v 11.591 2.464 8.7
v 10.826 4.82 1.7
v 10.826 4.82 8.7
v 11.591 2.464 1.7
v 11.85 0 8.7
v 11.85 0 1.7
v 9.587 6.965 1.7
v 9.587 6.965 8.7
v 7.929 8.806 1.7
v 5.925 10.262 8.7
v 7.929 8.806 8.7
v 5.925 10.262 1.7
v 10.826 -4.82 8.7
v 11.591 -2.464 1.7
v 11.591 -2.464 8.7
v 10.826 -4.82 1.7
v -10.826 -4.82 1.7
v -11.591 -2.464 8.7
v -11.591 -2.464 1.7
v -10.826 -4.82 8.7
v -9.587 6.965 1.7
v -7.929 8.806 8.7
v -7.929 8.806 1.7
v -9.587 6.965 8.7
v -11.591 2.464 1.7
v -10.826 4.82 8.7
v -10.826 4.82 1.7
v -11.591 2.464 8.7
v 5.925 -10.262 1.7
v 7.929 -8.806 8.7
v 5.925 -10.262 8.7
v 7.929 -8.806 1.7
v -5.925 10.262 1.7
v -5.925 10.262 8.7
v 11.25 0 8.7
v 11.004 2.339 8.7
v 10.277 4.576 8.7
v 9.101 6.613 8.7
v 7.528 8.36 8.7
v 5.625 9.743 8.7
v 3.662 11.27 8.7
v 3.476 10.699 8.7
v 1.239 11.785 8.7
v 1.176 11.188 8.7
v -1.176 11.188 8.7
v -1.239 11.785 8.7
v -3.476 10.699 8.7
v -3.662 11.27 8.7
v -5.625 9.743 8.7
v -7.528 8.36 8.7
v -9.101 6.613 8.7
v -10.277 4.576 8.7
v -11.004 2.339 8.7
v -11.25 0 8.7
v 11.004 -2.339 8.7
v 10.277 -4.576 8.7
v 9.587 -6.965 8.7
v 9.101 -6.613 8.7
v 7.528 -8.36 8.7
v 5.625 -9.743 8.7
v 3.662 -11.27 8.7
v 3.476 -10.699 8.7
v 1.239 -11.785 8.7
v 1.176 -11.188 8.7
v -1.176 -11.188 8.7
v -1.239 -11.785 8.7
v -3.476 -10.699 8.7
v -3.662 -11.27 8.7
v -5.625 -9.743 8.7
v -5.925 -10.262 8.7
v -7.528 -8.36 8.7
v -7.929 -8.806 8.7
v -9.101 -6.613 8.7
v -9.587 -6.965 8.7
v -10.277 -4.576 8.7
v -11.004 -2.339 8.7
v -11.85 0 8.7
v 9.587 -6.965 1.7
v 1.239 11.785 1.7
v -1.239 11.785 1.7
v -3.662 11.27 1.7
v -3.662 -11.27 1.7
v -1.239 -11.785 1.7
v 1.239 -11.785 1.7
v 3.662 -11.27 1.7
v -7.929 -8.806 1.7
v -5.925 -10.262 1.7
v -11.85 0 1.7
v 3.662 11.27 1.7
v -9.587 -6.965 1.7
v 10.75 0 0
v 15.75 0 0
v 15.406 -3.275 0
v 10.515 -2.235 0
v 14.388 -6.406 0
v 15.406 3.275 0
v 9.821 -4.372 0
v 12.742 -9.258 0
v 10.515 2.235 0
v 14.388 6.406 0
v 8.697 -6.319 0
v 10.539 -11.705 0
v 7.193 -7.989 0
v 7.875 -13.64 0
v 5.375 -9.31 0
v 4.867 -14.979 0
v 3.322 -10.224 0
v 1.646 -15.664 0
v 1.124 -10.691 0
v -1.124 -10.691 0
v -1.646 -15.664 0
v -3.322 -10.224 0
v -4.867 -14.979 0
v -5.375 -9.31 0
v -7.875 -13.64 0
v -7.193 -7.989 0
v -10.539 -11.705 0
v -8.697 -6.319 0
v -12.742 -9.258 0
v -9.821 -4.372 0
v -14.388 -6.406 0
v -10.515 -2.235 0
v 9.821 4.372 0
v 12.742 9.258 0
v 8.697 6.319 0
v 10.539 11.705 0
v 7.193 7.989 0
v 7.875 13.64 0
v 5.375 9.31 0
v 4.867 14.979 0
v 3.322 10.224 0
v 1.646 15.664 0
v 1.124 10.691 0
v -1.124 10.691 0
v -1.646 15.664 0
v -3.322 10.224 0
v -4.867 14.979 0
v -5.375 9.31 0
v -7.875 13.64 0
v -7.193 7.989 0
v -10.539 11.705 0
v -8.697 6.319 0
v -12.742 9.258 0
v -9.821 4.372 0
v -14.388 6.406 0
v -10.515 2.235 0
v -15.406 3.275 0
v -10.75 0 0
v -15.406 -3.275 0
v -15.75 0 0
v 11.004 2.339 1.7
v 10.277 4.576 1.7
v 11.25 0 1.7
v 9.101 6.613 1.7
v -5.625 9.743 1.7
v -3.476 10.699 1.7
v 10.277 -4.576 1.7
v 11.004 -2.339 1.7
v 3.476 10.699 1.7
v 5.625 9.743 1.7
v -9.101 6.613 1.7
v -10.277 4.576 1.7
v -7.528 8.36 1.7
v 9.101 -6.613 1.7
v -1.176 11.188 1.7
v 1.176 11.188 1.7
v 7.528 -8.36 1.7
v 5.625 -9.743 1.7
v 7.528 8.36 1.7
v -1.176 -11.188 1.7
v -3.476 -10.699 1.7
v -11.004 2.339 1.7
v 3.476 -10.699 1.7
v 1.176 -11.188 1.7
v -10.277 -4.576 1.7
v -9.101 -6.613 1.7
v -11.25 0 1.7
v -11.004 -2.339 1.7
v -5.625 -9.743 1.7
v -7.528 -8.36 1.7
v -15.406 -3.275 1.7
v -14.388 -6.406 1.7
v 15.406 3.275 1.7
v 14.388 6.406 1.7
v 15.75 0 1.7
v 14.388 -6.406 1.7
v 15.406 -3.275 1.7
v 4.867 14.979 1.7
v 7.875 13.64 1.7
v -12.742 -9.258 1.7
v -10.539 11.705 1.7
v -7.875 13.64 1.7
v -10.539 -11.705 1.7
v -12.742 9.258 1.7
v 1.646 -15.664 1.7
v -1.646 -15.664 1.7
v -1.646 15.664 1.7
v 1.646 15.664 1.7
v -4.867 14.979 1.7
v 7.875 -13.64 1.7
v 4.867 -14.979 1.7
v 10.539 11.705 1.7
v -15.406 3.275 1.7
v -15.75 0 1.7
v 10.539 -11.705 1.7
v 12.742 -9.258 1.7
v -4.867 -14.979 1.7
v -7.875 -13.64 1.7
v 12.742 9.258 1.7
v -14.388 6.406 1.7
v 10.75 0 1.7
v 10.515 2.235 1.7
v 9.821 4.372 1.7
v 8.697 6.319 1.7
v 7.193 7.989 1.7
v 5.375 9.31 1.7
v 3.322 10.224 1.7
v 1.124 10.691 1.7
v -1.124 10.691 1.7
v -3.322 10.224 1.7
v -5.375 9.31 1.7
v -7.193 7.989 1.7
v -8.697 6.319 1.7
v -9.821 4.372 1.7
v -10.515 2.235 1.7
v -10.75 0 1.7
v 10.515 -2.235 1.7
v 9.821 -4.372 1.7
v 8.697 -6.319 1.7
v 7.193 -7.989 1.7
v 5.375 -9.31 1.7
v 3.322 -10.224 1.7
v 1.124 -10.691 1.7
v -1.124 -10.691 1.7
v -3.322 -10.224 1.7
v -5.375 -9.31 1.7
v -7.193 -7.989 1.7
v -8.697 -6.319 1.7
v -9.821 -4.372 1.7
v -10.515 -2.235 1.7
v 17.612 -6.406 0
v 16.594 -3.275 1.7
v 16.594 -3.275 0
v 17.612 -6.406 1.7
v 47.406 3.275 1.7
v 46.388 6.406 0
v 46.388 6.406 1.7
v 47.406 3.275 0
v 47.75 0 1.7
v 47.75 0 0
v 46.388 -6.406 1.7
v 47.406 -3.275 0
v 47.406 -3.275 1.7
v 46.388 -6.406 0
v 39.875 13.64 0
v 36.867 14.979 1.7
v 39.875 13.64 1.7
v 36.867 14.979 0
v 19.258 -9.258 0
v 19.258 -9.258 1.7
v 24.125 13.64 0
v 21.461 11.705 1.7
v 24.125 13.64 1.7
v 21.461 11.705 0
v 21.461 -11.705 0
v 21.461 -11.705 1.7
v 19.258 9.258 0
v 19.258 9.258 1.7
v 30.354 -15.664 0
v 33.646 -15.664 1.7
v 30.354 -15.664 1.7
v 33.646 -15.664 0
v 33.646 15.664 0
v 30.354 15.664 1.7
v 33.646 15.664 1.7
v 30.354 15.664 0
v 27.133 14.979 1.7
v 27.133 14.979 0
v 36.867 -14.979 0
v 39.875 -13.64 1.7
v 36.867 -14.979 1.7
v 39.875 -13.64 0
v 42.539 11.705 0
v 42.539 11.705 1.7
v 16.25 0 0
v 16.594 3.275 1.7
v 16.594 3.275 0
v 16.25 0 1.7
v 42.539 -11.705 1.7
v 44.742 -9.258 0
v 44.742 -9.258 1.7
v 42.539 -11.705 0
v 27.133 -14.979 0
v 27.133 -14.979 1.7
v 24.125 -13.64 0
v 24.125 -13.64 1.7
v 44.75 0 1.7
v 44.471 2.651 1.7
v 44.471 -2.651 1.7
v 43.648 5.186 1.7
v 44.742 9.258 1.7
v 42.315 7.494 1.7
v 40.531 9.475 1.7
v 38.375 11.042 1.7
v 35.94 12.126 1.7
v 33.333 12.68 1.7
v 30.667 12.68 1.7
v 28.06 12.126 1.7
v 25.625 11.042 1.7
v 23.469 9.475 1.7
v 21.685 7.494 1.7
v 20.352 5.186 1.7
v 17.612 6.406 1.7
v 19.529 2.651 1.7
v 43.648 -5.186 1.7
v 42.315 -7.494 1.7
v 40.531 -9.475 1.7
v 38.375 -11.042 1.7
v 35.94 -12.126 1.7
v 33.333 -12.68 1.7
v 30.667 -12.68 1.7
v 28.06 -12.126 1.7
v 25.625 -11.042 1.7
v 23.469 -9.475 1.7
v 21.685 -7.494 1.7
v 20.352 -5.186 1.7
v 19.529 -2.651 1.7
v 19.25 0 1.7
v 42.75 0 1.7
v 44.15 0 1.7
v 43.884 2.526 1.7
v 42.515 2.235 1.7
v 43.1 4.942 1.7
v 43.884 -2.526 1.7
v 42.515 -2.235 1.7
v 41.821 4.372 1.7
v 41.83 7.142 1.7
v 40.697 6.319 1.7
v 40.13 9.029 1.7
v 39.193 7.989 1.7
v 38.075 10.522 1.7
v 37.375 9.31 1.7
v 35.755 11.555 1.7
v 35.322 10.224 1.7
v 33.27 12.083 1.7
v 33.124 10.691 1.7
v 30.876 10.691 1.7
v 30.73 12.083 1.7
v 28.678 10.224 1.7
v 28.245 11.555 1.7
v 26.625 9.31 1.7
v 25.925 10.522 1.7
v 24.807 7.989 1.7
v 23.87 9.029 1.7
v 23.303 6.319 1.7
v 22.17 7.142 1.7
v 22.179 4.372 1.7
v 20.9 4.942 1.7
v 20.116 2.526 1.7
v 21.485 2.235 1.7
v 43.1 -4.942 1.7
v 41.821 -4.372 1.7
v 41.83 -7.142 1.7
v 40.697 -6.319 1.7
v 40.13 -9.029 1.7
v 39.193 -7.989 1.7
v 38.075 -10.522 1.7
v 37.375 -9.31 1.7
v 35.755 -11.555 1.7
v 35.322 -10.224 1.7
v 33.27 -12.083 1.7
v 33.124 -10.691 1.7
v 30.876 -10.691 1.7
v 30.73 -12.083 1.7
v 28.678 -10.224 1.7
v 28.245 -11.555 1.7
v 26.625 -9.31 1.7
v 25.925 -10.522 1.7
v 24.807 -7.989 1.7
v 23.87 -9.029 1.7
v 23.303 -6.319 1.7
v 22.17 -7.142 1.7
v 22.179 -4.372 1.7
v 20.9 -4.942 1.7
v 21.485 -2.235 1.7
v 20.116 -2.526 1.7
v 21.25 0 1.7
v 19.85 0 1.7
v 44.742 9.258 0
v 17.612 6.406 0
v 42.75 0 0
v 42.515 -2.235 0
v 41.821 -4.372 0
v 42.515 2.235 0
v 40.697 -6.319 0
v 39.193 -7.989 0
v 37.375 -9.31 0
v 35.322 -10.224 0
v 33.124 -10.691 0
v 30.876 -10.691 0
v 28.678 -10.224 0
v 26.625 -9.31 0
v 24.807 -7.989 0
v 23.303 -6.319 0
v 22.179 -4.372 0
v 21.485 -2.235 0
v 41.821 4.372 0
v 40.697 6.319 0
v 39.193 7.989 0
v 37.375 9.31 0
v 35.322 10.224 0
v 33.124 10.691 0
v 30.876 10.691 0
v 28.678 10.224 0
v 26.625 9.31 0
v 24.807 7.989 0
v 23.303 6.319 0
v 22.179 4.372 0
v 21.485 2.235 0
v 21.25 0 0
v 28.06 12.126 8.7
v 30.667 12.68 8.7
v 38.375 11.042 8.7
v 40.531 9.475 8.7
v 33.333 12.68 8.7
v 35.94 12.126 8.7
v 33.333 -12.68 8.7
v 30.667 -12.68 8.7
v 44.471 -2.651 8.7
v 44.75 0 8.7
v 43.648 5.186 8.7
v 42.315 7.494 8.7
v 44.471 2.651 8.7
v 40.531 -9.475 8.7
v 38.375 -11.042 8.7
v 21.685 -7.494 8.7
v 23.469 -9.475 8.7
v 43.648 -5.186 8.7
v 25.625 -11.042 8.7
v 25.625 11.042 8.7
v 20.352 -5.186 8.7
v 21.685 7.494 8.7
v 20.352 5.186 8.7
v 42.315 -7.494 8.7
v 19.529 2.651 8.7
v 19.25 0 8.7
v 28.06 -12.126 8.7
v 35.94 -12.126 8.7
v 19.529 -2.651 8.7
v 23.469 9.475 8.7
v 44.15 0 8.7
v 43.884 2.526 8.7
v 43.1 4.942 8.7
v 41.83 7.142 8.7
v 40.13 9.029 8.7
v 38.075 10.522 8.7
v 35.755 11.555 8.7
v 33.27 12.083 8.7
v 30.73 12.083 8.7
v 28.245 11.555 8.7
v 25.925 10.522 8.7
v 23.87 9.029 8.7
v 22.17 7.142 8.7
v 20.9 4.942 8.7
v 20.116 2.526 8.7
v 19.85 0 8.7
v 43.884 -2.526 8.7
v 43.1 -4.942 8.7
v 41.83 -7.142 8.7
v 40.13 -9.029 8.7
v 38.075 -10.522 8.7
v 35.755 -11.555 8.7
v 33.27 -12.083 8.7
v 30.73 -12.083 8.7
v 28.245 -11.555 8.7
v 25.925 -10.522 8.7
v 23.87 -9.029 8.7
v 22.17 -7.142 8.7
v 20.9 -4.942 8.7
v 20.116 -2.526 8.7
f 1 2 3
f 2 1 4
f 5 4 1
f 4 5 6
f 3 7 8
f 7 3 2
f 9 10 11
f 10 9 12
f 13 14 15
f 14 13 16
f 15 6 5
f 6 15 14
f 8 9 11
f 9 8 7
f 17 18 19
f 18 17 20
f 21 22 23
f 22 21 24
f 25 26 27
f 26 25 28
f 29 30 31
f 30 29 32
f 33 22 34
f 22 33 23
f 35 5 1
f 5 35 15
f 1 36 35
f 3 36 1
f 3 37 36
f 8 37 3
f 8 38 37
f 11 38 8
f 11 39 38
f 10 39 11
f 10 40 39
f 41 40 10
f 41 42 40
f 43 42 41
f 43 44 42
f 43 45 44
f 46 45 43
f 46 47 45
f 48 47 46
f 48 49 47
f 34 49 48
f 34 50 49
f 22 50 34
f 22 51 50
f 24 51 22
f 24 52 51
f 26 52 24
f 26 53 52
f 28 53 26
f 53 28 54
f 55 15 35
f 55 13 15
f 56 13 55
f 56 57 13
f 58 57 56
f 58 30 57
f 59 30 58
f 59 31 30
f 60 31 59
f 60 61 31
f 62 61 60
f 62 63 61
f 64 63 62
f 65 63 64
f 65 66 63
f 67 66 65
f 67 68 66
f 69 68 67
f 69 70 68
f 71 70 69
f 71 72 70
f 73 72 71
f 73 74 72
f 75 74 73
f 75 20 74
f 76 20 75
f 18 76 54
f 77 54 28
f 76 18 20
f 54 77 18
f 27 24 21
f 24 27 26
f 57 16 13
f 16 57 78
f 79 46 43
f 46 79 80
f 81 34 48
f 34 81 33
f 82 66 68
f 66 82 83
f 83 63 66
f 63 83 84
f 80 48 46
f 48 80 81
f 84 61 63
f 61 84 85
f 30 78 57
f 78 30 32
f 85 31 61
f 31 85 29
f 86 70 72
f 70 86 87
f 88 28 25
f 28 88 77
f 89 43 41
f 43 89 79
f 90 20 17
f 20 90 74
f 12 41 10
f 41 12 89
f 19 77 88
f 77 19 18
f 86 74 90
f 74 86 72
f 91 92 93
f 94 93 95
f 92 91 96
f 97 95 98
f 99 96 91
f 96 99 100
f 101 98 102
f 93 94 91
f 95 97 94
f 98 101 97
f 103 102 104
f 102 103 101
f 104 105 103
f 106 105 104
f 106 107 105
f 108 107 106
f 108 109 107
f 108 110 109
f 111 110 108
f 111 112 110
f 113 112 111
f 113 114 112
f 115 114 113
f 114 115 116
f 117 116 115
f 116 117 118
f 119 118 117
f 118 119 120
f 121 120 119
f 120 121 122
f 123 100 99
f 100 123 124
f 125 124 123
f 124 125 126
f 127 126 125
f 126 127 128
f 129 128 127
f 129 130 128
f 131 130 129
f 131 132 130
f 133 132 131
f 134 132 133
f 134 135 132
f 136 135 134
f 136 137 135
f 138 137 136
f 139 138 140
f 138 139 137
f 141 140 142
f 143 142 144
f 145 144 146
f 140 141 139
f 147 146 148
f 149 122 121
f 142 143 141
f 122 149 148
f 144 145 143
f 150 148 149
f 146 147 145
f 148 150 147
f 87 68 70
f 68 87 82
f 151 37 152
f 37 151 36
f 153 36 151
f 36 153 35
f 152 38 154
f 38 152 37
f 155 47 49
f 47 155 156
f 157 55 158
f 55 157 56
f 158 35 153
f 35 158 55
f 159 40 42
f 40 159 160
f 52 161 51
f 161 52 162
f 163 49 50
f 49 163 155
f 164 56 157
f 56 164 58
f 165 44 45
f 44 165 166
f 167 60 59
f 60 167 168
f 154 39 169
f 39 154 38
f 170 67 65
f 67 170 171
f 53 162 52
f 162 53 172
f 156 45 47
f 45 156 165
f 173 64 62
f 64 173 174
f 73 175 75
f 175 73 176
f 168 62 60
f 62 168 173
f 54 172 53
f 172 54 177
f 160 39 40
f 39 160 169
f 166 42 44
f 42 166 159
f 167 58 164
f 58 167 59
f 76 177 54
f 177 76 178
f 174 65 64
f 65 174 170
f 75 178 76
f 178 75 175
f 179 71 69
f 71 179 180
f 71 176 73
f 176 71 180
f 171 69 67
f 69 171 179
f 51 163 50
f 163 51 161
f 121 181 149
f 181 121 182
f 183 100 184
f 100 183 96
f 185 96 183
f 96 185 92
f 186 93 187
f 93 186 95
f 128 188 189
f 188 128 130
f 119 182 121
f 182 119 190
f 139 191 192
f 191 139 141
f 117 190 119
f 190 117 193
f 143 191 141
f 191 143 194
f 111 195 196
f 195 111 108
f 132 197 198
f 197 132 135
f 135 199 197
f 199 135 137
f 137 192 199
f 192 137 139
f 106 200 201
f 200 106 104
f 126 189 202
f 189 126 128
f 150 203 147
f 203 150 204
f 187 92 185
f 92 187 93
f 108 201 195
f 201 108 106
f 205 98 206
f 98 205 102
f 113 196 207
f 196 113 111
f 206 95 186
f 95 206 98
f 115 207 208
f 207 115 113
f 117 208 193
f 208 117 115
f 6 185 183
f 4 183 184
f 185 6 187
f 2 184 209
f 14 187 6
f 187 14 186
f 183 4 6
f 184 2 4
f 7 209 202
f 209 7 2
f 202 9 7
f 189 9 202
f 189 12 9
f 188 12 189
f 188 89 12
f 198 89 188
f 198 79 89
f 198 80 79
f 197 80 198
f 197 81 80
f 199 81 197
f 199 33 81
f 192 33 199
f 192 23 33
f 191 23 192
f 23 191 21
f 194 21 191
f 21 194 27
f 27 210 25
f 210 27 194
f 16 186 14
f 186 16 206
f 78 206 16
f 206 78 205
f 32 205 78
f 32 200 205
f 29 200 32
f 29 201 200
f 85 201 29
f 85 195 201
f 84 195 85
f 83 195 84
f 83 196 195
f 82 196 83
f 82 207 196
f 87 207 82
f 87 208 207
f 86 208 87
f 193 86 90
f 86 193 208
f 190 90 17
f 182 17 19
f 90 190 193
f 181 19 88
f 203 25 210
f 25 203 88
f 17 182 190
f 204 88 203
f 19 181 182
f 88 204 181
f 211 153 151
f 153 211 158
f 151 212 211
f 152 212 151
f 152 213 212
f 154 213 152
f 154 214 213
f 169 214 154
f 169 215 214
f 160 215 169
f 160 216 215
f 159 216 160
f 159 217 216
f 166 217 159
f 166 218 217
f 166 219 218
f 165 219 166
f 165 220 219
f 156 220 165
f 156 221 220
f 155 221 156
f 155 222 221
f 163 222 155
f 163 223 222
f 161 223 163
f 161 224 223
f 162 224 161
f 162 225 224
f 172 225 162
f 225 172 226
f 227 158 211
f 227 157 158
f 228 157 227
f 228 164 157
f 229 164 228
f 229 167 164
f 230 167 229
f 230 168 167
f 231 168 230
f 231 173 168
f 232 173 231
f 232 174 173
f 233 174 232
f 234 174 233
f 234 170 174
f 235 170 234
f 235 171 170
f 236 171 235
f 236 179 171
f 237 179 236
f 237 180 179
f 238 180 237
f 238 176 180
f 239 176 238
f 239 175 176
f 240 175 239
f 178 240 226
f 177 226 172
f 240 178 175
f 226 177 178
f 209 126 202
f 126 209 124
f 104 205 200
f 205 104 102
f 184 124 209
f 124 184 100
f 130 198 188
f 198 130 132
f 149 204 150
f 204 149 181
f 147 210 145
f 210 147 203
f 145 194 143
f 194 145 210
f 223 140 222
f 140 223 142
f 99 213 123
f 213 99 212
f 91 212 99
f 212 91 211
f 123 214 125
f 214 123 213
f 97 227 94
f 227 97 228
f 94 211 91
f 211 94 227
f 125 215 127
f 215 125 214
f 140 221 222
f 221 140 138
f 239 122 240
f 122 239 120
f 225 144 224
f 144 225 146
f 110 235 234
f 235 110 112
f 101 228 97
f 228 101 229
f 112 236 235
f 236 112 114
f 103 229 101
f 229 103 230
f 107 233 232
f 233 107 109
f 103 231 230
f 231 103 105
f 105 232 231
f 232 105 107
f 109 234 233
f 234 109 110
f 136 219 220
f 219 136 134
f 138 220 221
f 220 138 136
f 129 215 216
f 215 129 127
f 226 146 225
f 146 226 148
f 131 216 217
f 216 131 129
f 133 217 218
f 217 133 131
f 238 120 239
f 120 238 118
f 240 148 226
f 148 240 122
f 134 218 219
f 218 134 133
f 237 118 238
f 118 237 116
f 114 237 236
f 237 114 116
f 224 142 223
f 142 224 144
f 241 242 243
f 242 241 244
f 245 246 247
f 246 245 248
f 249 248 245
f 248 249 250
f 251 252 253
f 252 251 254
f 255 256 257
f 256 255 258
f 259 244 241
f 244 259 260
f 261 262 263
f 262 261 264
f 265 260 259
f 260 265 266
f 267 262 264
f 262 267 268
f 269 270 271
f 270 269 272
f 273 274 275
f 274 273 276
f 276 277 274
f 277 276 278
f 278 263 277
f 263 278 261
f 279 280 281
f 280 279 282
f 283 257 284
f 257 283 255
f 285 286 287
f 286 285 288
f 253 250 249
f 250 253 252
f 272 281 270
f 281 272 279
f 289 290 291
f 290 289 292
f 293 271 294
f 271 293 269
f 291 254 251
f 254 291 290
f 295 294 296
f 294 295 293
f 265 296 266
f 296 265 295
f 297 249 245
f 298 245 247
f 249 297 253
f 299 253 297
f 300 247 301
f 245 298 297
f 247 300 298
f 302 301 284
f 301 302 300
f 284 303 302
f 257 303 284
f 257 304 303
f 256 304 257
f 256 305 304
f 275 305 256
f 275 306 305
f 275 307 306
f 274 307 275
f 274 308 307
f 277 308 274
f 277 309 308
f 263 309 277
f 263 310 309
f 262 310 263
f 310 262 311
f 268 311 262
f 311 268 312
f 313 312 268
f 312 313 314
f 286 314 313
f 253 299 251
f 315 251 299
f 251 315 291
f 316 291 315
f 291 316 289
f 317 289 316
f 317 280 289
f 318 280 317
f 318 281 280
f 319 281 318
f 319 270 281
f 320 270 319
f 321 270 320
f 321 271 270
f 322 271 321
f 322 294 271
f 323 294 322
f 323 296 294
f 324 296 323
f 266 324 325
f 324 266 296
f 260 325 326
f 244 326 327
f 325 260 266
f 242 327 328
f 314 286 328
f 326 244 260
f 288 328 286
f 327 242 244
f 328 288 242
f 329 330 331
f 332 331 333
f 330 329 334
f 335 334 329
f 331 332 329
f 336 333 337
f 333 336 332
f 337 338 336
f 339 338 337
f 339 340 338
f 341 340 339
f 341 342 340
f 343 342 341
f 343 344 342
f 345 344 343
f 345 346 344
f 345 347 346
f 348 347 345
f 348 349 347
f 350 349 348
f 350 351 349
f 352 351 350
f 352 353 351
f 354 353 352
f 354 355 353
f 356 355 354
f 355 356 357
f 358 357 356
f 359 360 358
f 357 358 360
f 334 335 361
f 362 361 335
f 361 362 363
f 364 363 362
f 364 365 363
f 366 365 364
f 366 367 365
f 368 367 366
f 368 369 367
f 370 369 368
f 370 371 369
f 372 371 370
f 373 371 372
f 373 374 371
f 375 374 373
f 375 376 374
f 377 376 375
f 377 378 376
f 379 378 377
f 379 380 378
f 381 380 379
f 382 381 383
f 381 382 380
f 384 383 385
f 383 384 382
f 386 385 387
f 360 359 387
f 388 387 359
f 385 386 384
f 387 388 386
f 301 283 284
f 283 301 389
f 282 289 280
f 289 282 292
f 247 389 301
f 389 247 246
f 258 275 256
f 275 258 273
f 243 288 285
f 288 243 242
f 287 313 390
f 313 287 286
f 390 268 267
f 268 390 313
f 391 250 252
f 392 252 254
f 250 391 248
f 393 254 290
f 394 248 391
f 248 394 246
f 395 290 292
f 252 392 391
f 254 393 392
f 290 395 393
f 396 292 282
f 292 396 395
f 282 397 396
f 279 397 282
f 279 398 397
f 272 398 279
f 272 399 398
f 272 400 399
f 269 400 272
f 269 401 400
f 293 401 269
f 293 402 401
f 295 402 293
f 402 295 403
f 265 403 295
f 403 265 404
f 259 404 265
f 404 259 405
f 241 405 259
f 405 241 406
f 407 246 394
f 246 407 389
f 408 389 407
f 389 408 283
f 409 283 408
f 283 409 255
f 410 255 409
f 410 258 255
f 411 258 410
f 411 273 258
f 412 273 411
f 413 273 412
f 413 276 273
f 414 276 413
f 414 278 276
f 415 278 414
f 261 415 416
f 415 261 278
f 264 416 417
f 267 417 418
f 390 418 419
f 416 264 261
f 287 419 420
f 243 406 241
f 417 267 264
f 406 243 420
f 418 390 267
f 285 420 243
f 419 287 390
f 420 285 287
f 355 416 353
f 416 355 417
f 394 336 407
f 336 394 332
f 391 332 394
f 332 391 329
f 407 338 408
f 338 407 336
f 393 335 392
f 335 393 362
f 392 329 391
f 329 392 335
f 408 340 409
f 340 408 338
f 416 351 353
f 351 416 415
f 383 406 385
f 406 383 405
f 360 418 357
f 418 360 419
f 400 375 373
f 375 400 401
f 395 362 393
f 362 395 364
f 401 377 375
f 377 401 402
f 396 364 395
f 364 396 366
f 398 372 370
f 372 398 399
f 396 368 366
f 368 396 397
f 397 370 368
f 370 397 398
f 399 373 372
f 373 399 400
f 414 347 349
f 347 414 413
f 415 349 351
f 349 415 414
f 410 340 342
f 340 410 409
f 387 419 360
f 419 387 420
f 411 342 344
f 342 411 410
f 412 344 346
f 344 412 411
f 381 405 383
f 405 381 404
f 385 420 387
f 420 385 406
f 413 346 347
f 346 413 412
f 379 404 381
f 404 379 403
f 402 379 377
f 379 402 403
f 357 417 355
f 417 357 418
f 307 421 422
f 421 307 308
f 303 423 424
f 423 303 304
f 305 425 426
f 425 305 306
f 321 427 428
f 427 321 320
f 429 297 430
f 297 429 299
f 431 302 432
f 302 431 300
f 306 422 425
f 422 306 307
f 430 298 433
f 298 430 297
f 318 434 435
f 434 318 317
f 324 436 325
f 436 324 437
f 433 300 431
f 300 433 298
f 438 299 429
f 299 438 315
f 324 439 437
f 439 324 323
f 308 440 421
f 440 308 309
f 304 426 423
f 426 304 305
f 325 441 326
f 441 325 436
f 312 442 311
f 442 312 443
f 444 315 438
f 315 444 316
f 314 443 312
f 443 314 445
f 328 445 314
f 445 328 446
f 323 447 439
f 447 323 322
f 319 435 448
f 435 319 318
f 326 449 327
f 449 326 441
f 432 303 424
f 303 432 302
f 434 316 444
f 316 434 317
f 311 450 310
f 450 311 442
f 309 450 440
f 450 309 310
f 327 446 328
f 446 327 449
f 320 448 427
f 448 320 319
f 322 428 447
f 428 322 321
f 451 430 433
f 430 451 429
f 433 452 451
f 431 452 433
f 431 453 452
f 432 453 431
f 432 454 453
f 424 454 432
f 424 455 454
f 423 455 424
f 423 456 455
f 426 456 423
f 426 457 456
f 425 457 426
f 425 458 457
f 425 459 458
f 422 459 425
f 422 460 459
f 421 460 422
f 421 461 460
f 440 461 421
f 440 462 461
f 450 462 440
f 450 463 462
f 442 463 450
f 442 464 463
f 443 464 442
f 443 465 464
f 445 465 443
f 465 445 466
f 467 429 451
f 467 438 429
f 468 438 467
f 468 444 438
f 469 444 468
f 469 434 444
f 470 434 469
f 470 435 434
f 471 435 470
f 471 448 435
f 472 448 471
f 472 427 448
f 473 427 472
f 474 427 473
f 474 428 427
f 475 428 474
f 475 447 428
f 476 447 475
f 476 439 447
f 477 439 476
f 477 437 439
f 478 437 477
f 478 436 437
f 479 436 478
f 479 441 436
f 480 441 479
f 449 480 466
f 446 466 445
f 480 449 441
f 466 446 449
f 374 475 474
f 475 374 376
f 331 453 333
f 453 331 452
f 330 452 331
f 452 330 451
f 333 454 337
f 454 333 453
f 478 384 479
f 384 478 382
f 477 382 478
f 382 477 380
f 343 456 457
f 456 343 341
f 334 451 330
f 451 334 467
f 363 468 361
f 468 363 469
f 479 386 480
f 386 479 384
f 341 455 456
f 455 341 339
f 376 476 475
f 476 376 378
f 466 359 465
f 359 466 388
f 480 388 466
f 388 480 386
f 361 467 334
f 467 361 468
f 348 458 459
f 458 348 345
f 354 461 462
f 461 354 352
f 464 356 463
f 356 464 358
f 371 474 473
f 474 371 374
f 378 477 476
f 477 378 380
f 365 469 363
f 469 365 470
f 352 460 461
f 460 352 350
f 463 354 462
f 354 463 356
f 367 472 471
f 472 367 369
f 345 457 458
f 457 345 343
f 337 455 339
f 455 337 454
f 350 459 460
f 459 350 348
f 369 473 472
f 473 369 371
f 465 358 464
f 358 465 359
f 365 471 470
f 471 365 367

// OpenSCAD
// This one is AWESOME design by Greg Frost!!

// PRUSA Mendel  
// Bearing guide
// GNU GPL v3
// Josef Průša
// josefprusa@me.com
// prusadjs.cz
// http://www.reprap.org/wiki/Prusa_Mendel
// http://github.com/prusajr/PrusaMendel


/**
 * Helps to hold belt aligned on the bearing.
 * @id bearing-guide
 * @name Bearing guide
 * @category Printed
 */

single_layer_width=0.6;
//bearing_inner=22.3;
bearing_inner=22.5;
thickness=1.7;
height=7+thickness;
wall_ascent=4.5;
wall_descent=0.5;

module inner()
{
	difference()
	{
		#cylinder(r=bearing_inner/2+single_layer_width,h=height);
		translate([0,0,-1])
		cylinder(r=bearing_inner/2,h=height+2);
	}

	difference()
	{
		cylinder(r=bearing_inner/2+wall_ascent,h=thickness);
		translate([0,0,-1])
		cylinder(r=bearing_inner/2-wall_descent,h=thickness+2);
	}
}

module outer()
{
	difference()
	{
		cylinder(r=bearing_inner/2+2*single_layer_width+0.3,h=height);
		translate([0,0,-1])
		cylinder(r=bearing_inner/2+single_layer_width+0.3,h=height+2);
	}

	difference()
	{
		cylinder(r=bearing_inner/2+wall_ascent,h=thickness);
		translate([0,0,-1])
		cylinder(r=bearing_inner/2-wall_descent,h=thickness+2);
	}
}

inner();

translate([32,0,0])
outer();
